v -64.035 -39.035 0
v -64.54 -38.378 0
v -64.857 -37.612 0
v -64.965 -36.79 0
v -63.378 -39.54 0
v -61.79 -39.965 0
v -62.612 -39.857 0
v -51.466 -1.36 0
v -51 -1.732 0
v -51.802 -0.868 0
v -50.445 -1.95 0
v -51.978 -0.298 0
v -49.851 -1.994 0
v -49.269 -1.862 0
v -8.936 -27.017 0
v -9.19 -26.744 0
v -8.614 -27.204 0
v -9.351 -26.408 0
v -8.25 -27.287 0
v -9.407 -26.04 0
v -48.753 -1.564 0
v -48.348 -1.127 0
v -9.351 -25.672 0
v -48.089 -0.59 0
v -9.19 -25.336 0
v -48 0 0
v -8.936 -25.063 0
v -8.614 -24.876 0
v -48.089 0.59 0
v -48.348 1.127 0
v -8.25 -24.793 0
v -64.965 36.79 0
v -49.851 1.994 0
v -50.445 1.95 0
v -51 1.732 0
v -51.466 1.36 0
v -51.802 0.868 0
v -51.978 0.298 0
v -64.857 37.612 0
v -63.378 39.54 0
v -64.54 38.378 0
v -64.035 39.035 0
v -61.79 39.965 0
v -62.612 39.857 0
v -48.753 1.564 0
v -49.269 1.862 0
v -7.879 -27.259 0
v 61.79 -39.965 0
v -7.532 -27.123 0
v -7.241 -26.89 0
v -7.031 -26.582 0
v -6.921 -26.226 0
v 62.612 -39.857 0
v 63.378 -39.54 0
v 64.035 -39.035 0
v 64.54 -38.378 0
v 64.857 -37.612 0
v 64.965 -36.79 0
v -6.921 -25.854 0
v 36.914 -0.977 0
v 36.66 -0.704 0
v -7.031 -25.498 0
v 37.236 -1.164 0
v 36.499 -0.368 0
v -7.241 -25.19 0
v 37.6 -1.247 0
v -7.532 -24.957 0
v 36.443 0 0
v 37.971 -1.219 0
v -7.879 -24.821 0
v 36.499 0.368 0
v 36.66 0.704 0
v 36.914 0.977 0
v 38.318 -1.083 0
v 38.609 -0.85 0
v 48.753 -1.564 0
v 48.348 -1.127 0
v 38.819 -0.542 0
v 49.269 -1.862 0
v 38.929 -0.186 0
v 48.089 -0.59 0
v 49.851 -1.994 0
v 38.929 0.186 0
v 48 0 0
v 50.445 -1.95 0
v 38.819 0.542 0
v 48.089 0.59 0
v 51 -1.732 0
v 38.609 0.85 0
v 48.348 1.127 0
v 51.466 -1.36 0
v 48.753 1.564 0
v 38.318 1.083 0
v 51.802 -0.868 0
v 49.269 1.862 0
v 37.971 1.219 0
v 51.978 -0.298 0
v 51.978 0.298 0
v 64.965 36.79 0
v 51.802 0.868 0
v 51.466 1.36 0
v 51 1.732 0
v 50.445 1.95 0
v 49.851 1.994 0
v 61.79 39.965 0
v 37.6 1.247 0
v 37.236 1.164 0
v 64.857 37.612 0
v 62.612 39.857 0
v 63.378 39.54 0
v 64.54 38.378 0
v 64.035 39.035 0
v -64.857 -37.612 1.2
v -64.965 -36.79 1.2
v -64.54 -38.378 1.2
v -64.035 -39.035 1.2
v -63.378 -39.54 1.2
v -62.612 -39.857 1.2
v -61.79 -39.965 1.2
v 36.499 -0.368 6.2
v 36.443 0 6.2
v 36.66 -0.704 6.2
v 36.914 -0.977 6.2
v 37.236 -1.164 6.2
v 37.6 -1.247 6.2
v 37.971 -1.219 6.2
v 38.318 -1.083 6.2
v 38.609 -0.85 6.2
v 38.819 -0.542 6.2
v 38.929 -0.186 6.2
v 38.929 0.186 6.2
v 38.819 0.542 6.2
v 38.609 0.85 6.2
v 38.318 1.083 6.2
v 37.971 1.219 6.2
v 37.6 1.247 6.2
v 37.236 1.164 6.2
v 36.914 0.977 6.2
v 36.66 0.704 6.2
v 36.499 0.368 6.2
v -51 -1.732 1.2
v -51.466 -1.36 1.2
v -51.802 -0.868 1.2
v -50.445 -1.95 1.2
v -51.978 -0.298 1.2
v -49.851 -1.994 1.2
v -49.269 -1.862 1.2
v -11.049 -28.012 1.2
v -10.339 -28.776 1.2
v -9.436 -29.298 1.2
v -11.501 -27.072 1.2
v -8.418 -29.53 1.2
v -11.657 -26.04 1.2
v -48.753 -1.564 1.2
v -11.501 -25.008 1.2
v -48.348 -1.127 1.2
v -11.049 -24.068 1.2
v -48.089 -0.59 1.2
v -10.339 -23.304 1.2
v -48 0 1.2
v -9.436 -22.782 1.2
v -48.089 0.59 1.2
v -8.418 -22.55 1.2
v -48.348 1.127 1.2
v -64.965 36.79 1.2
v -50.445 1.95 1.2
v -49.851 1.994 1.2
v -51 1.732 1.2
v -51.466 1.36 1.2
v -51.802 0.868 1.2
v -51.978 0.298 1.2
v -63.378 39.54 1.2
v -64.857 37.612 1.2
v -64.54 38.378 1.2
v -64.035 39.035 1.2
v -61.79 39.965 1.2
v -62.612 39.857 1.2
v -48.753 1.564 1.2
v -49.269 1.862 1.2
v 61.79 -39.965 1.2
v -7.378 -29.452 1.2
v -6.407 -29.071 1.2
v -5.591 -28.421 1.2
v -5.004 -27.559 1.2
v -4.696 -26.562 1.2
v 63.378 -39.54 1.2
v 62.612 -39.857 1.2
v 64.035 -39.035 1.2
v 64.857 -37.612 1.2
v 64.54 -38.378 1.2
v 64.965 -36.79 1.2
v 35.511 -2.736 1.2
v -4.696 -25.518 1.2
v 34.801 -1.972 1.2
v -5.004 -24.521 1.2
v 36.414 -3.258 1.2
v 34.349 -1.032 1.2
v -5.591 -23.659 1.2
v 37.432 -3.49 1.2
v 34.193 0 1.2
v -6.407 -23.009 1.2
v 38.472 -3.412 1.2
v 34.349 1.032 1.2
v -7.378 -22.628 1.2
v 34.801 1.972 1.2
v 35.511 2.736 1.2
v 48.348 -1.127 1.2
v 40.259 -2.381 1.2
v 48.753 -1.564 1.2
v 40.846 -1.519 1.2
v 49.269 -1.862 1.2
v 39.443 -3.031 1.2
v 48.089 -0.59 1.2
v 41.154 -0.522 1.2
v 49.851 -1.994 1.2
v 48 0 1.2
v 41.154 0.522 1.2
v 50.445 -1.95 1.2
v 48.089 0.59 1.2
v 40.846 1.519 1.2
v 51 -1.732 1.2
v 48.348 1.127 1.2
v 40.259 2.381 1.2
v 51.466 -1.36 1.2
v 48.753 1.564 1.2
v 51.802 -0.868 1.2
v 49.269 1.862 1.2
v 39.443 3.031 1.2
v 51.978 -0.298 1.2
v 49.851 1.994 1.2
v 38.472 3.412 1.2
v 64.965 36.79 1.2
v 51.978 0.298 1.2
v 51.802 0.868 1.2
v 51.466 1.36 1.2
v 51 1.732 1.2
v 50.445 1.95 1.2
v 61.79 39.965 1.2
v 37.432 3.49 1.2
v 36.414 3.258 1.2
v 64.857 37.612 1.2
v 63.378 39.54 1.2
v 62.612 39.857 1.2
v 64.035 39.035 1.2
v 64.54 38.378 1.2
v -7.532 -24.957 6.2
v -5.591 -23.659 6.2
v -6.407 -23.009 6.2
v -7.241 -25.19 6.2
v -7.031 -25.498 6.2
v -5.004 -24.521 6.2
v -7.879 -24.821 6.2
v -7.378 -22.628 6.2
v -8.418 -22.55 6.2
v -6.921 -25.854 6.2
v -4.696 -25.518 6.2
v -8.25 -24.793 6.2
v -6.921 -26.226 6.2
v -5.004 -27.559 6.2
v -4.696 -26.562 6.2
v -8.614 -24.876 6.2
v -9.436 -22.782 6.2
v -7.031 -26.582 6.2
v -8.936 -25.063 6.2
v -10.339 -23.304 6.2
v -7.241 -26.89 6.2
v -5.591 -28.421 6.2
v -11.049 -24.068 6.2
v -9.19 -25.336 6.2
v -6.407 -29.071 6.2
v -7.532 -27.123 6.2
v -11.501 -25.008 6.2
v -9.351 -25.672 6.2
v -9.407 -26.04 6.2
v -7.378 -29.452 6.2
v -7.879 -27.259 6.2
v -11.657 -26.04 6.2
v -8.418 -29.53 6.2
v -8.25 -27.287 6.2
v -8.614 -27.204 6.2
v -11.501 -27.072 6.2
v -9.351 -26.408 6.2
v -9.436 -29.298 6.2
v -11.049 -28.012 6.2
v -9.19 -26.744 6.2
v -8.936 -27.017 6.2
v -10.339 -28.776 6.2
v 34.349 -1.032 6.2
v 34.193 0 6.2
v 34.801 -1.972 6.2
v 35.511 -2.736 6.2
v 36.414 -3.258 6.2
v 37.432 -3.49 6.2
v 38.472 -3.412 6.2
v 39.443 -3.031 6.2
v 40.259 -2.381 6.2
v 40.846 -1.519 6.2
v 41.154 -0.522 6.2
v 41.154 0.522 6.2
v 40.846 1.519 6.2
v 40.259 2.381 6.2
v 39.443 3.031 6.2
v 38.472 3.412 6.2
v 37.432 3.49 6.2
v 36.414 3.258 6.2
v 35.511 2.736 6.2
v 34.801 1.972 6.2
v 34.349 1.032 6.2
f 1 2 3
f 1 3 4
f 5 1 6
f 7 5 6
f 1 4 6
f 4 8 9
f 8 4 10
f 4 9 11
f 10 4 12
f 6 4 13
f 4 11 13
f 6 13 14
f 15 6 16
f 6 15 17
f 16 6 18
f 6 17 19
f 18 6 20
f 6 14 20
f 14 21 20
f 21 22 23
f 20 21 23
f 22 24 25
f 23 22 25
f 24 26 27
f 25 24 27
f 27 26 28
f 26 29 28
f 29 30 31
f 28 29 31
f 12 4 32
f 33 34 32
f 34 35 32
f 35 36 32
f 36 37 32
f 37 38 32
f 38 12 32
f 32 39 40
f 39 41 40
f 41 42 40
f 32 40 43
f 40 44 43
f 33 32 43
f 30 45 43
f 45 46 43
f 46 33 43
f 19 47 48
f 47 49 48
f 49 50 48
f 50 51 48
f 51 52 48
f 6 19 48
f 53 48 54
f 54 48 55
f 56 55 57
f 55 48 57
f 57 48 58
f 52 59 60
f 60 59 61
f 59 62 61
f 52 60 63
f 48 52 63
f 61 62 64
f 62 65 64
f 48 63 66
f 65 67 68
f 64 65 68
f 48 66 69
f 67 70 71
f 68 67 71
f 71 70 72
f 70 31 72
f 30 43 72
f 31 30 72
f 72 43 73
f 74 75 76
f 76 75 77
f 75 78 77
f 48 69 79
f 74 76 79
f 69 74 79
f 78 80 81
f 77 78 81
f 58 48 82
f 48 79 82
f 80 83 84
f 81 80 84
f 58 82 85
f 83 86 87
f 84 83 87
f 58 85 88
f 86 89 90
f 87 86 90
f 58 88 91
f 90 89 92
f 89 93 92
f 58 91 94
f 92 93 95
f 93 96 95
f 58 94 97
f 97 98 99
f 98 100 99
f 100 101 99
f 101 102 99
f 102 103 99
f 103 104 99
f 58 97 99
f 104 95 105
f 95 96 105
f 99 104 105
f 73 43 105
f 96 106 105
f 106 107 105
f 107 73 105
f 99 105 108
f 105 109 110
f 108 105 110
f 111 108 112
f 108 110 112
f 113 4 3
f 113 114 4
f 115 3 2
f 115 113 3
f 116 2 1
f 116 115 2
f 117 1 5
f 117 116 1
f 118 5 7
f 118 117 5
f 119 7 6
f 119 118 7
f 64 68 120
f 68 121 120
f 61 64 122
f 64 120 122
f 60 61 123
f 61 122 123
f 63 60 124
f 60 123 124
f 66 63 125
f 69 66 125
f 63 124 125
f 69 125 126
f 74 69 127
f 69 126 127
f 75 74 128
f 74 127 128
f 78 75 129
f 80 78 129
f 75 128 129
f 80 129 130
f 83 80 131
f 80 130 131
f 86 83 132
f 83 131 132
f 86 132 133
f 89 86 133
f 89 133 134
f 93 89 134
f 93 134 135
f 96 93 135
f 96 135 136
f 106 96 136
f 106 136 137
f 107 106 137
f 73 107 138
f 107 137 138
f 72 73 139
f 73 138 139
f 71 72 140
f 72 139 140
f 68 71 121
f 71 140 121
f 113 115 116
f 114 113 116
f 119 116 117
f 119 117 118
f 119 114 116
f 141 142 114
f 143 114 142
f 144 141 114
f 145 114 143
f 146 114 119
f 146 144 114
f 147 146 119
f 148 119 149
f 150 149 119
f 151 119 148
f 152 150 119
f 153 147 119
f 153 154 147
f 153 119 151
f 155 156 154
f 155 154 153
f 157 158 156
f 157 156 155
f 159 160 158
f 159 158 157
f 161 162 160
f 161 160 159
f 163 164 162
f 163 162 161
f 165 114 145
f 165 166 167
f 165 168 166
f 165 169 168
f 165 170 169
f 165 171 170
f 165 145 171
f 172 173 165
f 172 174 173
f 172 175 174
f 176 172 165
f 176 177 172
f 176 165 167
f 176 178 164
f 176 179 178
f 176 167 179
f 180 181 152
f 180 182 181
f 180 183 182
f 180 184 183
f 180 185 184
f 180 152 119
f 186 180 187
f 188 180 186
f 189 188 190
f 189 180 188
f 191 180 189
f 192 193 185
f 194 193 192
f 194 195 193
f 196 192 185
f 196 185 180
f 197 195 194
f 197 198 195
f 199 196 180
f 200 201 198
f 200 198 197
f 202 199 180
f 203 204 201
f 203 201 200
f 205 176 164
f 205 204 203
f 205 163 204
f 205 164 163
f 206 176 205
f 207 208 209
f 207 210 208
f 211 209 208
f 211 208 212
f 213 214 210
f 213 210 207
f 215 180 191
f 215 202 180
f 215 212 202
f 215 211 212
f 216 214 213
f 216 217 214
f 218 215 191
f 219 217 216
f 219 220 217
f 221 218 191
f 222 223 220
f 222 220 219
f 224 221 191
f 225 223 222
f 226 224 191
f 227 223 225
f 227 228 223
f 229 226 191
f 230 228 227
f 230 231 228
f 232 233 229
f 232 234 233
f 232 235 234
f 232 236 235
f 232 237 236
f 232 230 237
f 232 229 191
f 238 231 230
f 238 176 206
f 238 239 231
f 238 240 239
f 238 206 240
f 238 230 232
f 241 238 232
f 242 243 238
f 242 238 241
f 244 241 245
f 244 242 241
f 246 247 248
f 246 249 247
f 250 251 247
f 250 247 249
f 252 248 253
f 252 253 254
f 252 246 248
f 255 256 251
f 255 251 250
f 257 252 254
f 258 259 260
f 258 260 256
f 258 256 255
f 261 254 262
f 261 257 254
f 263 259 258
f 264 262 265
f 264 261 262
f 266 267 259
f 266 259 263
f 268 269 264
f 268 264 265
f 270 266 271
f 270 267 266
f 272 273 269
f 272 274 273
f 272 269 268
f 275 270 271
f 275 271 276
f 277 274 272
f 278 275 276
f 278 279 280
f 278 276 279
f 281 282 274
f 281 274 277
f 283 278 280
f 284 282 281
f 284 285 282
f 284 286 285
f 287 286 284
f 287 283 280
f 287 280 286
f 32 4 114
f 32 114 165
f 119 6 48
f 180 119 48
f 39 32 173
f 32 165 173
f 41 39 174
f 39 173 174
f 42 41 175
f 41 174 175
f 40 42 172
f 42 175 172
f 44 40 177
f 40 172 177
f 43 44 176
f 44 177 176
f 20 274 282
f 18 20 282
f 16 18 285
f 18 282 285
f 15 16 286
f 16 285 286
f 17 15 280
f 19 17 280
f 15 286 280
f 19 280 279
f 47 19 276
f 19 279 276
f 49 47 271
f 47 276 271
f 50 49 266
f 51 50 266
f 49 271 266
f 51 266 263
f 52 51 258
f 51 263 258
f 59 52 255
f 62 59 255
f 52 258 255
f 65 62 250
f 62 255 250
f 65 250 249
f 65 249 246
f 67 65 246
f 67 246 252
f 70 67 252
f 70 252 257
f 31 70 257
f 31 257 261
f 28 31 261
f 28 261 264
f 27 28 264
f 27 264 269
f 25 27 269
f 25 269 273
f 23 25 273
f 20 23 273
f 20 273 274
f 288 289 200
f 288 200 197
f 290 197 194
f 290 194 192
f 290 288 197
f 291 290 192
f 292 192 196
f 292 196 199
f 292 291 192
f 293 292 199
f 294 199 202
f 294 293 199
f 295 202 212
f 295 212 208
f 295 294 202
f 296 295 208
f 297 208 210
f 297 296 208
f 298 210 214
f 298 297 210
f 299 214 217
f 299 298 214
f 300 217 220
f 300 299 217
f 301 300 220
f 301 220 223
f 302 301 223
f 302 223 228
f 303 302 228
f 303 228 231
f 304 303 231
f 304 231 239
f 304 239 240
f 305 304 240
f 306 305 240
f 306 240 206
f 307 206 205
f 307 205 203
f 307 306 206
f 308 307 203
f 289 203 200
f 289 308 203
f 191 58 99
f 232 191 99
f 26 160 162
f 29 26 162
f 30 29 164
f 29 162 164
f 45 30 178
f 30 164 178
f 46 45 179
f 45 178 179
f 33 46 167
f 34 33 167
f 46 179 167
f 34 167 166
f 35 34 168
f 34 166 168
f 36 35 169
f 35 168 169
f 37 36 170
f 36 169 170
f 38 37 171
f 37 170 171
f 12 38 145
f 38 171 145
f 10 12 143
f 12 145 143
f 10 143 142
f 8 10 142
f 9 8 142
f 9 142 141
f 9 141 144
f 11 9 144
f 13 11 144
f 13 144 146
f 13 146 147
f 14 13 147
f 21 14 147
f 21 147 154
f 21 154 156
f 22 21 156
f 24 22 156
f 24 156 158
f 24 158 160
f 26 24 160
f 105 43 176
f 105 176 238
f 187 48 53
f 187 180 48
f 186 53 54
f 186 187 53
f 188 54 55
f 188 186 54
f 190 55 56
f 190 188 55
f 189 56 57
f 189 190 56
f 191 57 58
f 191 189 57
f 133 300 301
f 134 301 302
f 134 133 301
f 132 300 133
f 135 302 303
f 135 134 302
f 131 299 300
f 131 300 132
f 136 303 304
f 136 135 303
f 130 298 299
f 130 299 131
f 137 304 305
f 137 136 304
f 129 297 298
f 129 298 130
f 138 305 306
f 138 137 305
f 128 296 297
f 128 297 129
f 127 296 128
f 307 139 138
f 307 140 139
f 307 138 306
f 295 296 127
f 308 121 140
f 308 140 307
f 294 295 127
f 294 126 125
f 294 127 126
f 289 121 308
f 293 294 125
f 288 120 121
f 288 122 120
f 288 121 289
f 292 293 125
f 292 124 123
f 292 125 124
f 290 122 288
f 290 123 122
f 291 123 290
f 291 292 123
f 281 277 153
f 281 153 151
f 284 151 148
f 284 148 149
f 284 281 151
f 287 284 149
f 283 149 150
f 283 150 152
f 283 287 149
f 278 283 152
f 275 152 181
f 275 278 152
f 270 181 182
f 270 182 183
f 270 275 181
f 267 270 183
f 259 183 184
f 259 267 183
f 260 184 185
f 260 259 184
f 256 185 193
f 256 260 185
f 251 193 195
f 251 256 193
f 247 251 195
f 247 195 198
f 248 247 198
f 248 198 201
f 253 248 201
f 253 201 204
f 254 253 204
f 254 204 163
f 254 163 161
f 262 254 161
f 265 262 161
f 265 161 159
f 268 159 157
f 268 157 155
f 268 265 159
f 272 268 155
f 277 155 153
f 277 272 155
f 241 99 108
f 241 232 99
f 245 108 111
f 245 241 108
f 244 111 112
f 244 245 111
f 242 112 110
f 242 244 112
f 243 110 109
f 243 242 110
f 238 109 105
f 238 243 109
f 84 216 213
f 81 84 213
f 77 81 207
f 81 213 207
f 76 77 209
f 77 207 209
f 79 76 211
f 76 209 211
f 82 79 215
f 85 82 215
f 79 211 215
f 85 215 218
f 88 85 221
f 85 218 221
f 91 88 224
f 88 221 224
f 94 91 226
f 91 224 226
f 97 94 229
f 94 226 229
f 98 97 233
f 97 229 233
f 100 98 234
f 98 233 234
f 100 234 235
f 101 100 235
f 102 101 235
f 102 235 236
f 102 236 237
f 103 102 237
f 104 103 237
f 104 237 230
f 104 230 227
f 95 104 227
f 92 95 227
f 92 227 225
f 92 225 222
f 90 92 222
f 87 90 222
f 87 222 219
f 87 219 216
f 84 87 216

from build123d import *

# Parameters (mm, degrees)
SKETCH1_W                      = 129.93
SKETCH1_H                      = 79.93
BOSS_EXTRUDE1_DEPTH            = 1.2
FILLET1_R                      = 3.175
CUT_EXTRUDE2_REACH             = 78.283
SKETCH3_R                      = 2
CUT_EXTRUDE1_REACH             = 78.283
SKETCH2_R                      = 1.25
CUT_EXTRUDE1_DIRECTION_2_DEPTH = 77.282976148
BOSS_EXTRUDE2_START            = 5
SKETCH4_R                      = 3.5
SKETCH4_R_2                    = 1.25
BOSS_EXTRUDE2_DEPTH            = 5


with BuildPart() as part:
    # Sketch1 → Boss-Extrude1 (new body)
    with BuildSketch(Plane.XY):
        Rectangle(SKETCH1_W, SKETCH1_H)
    extrude(amount=BOSS_EXTRUDE1_DEPTH)

    # Fillet1
    fillet1_edges = [part.edges().sort_by_distance(p)[0] for p in [
        (64.965, -39.965, 0.6),
        (-64.965, -39.965, 0.6),
        (-64.965, 39.965, 0.6),
        (64.965, 39.965, 0.6),
    ]]
    fillet(fillet1_edges, radius=FILLET1_R)

    # Sketch3 → Cut-Extrude2 (cut, up to next)
    with BuildSketch(Plane.XY.offset(1.2), mode=Mode.PRIVATE) as cut_extrude2_sk1:
        with Locations((-50, 0)):
            Circle(SKETCH3_R)
    cut_extrude2_tool1 = extrude(cut_extrude2_sk1.sketch, amount=-CUT_EXTRUDE2_REACH, mode=Mode.PRIVATE) & part.part
    # Sketch3 → Cut-Extrude2 (cut, up to next)
    with BuildSketch(Plane.XY.offset(1.2), mode=Mode.PRIVATE) as cut_extrude2_sk2:
        with Locations(Location((50, 0, 0), (0, 0, 180))):
            Circle(SKETCH3_R)
    cut_extrude2_tool2 = extrude(cut_extrude2_sk2.sketch, amount=-CUT_EXTRUDE2_REACH, mode=Mode.PRIVATE) & part.part
    add(cut_extrude2_tool1.solids().sort_by_distance((-50, 0, 1.2))[0], mode=Mode.SUBTRACT)
    add(cut_extrude2_tool2.solids().sort_by_distance((50, 0, 1.2))[0], mode=Mode.SUBTRACT)

    # Sketch2 → Cut-Extrude1 (cut, up to next)
    with BuildSketch(Plane.XY.offset(1.2), mode=Mode.PRIVATE) as cut_extrude1_sk1:
        with Locations(Location((-8.156928596, -26.04, 0), (0, 0, 180))):
            Circle(SKETCH2_R)
    cut_extrude1_tool1 = extrude(cut_extrude1_sk1.sketch, amount=-CUT_EXTRUDE1_REACH, mode=Mode.PRIVATE) & part.part
    # Sketch2 → Cut-Extrude1 (cut, up to next)
    with BuildSketch(Plane.XY.offset(1.2), mode=Mode.PRIVATE) as cut_extrude1_sk2:
        with Locations(Location((37.693071404, 0, 0), (0, 0, 180))):
            Circle(SKETCH2_R)
    cut_extrude1_tool2 = extrude(cut_extrude1_sk2.sketch, amount=-CUT_EXTRUDE1_REACH, mode=Mode.PRIVATE) & part.part
    add(cut_extrude1_tool1.solids().sort_by_distance((-8.156929, -26.04, 1.2))[0], mode=Mode.SUBTRACT)
    add(cut_extrude1_tool2.solids().sort_by_distance((37.693071, 0, 1.2))[0], mode=Mode.SUBTRACT)

    # Sketch2 → Cut-Extrude1 direction 2 (cut)
    with BuildSketch(Plane.XY.offset(1.2)):
        with Locations(Location((-8.156928596, -26.04, 0), (0, 0, 180))):
            Circle(SKETCH2_R)
        with Locations(Location((37.693071404, 0, 0), (0, 0, 180))):
            Circle(SKETCH2_R)
    extrude(amount=CUT_EXTRUDE1_DIRECTION_2_DEPTH, mode=Mode.SUBTRACT)

    # Sketch4 → Boss-Extrude2 (add)
    # profile 1 of 2: a face of its own
    with BuildSketch(Plane.XY.offset(1.2).offset(BOSS_EXTRUDE2_START)):
        with Locations(Location((-8.156928596, -26.04, 0), (0, 0, 180))):
            Circle(SKETCH4_R)
        with Locations(Location((-8.156928596, -26.04, 0), (0, 0, 180))):
            Circle(SKETCH4_R_2, mode=Mode.SUBTRACT)
    # profile 2 of 2: a face of its own
    with BuildSketch(Plane.XY.offset(1.2).offset(BOSS_EXTRUDE2_START)):
        with Locations(Location((37.693071404, 0, 0), (0, 0, 180))):
            Circle(SKETCH4_R)
        with Locations(Location((37.693071404, 0, 0), (0, 0, 180))):
            Circle(SKETCH4_R_2, mode=Mode.SUBTRACT)
    extrude(amount=-BOSS_EXTRUDE2_DEPTH)


solid = part.part
